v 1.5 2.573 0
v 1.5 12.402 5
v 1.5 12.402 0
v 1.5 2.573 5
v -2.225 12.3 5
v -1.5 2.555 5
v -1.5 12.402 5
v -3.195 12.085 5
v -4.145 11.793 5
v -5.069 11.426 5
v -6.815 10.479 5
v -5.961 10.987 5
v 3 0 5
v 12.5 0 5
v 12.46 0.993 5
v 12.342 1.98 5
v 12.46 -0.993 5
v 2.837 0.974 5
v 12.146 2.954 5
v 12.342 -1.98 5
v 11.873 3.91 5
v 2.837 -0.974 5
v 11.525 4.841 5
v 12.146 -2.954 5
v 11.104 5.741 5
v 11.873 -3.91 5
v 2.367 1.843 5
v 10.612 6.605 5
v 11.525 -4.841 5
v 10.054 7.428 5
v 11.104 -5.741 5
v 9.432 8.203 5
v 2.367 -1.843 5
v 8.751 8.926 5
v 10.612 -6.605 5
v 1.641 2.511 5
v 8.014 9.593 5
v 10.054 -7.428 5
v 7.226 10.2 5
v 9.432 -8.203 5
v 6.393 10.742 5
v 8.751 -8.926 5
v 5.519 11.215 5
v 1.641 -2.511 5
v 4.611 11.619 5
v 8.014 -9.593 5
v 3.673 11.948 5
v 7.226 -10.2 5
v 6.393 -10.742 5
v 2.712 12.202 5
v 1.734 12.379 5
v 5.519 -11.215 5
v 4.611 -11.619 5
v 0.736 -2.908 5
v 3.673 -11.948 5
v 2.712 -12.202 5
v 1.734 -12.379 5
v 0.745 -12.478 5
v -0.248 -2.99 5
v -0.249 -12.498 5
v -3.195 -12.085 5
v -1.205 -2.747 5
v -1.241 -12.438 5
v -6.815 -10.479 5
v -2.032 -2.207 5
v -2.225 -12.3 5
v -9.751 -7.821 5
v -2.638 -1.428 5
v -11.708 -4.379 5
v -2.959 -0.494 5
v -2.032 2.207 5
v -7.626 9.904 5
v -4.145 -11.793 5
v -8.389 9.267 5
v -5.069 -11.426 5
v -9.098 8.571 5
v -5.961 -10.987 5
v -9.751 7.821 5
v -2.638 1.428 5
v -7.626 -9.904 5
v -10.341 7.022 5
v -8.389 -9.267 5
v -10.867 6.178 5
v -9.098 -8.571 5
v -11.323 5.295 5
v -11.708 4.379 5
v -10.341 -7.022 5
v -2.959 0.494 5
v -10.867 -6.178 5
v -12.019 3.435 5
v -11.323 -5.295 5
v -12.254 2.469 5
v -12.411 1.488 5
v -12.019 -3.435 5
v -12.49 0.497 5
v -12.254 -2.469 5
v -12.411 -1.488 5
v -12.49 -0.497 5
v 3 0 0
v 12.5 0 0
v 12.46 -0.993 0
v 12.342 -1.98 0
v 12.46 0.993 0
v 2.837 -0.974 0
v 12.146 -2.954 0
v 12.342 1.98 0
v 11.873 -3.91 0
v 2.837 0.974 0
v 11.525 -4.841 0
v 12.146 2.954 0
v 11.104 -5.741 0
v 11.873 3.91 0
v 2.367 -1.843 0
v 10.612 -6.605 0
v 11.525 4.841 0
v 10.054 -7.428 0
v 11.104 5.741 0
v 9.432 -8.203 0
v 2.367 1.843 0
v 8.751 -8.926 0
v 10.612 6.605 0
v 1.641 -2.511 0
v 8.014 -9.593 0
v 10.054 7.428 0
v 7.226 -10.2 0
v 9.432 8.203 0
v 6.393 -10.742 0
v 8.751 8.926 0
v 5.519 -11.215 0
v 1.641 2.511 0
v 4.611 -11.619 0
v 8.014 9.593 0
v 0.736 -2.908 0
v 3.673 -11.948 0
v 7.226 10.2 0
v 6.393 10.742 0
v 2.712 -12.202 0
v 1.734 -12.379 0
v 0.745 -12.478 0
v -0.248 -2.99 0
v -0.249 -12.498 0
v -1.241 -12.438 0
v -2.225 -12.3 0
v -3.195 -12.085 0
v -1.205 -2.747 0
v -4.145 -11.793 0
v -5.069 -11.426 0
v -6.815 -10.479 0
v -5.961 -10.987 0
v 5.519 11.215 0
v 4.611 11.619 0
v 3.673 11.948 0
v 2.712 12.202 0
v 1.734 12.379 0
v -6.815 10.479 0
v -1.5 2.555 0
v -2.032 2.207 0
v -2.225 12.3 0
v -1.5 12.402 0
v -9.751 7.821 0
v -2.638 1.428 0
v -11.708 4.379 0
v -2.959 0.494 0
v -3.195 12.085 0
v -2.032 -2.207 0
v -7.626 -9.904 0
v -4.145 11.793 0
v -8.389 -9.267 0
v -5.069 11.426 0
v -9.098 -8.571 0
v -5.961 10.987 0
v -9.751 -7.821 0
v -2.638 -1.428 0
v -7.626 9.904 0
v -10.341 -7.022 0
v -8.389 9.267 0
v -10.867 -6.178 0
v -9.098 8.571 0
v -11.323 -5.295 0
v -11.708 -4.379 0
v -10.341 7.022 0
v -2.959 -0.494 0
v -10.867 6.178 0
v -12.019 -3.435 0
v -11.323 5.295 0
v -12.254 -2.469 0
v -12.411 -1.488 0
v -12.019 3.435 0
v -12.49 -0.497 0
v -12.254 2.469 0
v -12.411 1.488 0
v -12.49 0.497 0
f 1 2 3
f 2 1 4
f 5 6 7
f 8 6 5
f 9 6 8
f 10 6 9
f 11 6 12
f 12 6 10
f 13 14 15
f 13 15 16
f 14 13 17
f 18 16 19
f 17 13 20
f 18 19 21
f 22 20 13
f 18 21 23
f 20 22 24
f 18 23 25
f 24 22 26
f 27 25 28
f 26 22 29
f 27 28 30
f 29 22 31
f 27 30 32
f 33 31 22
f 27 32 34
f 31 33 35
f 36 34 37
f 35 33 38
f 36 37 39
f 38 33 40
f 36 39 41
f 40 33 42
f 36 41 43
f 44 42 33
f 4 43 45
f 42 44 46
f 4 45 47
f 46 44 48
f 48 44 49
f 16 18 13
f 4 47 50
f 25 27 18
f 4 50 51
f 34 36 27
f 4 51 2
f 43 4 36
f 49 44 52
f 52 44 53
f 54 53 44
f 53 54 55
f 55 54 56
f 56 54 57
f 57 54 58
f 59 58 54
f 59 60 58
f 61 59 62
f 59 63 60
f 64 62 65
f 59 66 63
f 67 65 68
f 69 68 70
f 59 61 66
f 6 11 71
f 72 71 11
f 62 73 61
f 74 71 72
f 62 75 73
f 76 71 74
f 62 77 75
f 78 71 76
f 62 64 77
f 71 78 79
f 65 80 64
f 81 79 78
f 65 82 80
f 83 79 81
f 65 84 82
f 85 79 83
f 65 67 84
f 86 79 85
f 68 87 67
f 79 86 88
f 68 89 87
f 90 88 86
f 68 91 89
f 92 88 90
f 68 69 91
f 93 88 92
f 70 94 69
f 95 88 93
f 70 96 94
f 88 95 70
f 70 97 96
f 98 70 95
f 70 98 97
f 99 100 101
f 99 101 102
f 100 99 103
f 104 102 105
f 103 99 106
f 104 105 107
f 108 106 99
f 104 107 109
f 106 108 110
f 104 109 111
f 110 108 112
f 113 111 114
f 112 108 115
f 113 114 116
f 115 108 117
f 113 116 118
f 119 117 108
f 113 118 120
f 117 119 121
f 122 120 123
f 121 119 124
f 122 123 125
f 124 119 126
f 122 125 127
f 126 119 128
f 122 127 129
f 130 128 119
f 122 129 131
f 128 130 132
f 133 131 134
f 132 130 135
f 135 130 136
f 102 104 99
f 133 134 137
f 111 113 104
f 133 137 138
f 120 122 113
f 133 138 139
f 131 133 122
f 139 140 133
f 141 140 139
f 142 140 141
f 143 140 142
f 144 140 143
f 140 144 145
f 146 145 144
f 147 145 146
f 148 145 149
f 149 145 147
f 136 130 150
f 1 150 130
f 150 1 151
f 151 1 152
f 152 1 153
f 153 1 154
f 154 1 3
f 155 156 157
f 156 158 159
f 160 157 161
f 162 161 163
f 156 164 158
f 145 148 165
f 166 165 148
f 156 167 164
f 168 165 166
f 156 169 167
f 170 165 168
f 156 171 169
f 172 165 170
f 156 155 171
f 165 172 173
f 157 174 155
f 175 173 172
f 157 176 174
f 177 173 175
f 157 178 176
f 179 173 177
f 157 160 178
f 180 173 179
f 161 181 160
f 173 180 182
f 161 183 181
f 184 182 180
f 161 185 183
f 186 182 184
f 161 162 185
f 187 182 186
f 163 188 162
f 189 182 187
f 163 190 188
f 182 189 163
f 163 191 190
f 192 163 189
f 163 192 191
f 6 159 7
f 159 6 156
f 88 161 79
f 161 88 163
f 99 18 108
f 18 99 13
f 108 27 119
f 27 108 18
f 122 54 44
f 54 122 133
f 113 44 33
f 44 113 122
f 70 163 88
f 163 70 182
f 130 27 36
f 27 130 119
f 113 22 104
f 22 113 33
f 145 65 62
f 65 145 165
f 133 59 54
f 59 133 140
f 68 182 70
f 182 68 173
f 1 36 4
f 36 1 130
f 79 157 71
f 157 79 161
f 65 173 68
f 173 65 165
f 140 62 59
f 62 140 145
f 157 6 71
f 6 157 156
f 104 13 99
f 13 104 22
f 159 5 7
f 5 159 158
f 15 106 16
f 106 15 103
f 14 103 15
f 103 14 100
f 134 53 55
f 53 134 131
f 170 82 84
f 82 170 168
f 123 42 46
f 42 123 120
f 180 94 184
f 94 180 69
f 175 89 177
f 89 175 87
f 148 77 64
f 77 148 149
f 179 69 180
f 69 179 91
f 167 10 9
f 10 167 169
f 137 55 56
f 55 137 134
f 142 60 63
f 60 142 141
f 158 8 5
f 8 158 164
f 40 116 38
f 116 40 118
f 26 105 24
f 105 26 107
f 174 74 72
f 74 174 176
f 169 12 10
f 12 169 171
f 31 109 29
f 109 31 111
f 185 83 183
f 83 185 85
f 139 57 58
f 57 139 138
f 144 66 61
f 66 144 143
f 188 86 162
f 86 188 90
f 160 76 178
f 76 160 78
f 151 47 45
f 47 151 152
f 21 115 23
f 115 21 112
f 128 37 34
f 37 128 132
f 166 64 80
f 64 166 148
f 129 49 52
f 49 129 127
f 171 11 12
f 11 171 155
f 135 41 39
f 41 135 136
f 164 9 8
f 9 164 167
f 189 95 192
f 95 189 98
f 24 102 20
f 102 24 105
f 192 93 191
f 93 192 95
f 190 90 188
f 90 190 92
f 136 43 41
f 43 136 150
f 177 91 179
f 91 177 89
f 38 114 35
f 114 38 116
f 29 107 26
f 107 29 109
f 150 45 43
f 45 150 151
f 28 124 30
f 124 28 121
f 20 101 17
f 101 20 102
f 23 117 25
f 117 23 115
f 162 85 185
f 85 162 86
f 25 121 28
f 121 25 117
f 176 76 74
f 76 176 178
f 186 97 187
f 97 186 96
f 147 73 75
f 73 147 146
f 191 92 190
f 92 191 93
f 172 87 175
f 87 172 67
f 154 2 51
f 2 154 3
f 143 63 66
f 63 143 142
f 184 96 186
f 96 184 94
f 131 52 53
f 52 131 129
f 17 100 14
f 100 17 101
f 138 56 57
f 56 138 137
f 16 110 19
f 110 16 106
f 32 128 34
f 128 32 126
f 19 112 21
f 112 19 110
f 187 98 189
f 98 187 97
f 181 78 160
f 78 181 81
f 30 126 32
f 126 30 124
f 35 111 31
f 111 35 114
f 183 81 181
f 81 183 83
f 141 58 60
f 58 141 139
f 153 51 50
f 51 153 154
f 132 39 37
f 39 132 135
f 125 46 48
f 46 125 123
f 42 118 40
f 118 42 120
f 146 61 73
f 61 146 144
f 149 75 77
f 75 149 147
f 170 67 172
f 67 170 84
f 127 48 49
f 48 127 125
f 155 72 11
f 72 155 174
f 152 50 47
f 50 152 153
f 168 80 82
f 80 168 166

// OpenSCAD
/*
 * Small Spacer
 */
MajorDiam = 25;
InternalDiam = 6;
Height = 5;


$fa =  1;
$fs = 1;

difference() {
  cylinder(r=MajorDiam/2, h=Height);
  union() {
    translate([-InternalDiam/4, 0, 0]) {
      cube([InternalDiam/2, MajorDiam, Height]);
    }
    cylinder(r=InternalDiam/2, h=Height);
  }
}
